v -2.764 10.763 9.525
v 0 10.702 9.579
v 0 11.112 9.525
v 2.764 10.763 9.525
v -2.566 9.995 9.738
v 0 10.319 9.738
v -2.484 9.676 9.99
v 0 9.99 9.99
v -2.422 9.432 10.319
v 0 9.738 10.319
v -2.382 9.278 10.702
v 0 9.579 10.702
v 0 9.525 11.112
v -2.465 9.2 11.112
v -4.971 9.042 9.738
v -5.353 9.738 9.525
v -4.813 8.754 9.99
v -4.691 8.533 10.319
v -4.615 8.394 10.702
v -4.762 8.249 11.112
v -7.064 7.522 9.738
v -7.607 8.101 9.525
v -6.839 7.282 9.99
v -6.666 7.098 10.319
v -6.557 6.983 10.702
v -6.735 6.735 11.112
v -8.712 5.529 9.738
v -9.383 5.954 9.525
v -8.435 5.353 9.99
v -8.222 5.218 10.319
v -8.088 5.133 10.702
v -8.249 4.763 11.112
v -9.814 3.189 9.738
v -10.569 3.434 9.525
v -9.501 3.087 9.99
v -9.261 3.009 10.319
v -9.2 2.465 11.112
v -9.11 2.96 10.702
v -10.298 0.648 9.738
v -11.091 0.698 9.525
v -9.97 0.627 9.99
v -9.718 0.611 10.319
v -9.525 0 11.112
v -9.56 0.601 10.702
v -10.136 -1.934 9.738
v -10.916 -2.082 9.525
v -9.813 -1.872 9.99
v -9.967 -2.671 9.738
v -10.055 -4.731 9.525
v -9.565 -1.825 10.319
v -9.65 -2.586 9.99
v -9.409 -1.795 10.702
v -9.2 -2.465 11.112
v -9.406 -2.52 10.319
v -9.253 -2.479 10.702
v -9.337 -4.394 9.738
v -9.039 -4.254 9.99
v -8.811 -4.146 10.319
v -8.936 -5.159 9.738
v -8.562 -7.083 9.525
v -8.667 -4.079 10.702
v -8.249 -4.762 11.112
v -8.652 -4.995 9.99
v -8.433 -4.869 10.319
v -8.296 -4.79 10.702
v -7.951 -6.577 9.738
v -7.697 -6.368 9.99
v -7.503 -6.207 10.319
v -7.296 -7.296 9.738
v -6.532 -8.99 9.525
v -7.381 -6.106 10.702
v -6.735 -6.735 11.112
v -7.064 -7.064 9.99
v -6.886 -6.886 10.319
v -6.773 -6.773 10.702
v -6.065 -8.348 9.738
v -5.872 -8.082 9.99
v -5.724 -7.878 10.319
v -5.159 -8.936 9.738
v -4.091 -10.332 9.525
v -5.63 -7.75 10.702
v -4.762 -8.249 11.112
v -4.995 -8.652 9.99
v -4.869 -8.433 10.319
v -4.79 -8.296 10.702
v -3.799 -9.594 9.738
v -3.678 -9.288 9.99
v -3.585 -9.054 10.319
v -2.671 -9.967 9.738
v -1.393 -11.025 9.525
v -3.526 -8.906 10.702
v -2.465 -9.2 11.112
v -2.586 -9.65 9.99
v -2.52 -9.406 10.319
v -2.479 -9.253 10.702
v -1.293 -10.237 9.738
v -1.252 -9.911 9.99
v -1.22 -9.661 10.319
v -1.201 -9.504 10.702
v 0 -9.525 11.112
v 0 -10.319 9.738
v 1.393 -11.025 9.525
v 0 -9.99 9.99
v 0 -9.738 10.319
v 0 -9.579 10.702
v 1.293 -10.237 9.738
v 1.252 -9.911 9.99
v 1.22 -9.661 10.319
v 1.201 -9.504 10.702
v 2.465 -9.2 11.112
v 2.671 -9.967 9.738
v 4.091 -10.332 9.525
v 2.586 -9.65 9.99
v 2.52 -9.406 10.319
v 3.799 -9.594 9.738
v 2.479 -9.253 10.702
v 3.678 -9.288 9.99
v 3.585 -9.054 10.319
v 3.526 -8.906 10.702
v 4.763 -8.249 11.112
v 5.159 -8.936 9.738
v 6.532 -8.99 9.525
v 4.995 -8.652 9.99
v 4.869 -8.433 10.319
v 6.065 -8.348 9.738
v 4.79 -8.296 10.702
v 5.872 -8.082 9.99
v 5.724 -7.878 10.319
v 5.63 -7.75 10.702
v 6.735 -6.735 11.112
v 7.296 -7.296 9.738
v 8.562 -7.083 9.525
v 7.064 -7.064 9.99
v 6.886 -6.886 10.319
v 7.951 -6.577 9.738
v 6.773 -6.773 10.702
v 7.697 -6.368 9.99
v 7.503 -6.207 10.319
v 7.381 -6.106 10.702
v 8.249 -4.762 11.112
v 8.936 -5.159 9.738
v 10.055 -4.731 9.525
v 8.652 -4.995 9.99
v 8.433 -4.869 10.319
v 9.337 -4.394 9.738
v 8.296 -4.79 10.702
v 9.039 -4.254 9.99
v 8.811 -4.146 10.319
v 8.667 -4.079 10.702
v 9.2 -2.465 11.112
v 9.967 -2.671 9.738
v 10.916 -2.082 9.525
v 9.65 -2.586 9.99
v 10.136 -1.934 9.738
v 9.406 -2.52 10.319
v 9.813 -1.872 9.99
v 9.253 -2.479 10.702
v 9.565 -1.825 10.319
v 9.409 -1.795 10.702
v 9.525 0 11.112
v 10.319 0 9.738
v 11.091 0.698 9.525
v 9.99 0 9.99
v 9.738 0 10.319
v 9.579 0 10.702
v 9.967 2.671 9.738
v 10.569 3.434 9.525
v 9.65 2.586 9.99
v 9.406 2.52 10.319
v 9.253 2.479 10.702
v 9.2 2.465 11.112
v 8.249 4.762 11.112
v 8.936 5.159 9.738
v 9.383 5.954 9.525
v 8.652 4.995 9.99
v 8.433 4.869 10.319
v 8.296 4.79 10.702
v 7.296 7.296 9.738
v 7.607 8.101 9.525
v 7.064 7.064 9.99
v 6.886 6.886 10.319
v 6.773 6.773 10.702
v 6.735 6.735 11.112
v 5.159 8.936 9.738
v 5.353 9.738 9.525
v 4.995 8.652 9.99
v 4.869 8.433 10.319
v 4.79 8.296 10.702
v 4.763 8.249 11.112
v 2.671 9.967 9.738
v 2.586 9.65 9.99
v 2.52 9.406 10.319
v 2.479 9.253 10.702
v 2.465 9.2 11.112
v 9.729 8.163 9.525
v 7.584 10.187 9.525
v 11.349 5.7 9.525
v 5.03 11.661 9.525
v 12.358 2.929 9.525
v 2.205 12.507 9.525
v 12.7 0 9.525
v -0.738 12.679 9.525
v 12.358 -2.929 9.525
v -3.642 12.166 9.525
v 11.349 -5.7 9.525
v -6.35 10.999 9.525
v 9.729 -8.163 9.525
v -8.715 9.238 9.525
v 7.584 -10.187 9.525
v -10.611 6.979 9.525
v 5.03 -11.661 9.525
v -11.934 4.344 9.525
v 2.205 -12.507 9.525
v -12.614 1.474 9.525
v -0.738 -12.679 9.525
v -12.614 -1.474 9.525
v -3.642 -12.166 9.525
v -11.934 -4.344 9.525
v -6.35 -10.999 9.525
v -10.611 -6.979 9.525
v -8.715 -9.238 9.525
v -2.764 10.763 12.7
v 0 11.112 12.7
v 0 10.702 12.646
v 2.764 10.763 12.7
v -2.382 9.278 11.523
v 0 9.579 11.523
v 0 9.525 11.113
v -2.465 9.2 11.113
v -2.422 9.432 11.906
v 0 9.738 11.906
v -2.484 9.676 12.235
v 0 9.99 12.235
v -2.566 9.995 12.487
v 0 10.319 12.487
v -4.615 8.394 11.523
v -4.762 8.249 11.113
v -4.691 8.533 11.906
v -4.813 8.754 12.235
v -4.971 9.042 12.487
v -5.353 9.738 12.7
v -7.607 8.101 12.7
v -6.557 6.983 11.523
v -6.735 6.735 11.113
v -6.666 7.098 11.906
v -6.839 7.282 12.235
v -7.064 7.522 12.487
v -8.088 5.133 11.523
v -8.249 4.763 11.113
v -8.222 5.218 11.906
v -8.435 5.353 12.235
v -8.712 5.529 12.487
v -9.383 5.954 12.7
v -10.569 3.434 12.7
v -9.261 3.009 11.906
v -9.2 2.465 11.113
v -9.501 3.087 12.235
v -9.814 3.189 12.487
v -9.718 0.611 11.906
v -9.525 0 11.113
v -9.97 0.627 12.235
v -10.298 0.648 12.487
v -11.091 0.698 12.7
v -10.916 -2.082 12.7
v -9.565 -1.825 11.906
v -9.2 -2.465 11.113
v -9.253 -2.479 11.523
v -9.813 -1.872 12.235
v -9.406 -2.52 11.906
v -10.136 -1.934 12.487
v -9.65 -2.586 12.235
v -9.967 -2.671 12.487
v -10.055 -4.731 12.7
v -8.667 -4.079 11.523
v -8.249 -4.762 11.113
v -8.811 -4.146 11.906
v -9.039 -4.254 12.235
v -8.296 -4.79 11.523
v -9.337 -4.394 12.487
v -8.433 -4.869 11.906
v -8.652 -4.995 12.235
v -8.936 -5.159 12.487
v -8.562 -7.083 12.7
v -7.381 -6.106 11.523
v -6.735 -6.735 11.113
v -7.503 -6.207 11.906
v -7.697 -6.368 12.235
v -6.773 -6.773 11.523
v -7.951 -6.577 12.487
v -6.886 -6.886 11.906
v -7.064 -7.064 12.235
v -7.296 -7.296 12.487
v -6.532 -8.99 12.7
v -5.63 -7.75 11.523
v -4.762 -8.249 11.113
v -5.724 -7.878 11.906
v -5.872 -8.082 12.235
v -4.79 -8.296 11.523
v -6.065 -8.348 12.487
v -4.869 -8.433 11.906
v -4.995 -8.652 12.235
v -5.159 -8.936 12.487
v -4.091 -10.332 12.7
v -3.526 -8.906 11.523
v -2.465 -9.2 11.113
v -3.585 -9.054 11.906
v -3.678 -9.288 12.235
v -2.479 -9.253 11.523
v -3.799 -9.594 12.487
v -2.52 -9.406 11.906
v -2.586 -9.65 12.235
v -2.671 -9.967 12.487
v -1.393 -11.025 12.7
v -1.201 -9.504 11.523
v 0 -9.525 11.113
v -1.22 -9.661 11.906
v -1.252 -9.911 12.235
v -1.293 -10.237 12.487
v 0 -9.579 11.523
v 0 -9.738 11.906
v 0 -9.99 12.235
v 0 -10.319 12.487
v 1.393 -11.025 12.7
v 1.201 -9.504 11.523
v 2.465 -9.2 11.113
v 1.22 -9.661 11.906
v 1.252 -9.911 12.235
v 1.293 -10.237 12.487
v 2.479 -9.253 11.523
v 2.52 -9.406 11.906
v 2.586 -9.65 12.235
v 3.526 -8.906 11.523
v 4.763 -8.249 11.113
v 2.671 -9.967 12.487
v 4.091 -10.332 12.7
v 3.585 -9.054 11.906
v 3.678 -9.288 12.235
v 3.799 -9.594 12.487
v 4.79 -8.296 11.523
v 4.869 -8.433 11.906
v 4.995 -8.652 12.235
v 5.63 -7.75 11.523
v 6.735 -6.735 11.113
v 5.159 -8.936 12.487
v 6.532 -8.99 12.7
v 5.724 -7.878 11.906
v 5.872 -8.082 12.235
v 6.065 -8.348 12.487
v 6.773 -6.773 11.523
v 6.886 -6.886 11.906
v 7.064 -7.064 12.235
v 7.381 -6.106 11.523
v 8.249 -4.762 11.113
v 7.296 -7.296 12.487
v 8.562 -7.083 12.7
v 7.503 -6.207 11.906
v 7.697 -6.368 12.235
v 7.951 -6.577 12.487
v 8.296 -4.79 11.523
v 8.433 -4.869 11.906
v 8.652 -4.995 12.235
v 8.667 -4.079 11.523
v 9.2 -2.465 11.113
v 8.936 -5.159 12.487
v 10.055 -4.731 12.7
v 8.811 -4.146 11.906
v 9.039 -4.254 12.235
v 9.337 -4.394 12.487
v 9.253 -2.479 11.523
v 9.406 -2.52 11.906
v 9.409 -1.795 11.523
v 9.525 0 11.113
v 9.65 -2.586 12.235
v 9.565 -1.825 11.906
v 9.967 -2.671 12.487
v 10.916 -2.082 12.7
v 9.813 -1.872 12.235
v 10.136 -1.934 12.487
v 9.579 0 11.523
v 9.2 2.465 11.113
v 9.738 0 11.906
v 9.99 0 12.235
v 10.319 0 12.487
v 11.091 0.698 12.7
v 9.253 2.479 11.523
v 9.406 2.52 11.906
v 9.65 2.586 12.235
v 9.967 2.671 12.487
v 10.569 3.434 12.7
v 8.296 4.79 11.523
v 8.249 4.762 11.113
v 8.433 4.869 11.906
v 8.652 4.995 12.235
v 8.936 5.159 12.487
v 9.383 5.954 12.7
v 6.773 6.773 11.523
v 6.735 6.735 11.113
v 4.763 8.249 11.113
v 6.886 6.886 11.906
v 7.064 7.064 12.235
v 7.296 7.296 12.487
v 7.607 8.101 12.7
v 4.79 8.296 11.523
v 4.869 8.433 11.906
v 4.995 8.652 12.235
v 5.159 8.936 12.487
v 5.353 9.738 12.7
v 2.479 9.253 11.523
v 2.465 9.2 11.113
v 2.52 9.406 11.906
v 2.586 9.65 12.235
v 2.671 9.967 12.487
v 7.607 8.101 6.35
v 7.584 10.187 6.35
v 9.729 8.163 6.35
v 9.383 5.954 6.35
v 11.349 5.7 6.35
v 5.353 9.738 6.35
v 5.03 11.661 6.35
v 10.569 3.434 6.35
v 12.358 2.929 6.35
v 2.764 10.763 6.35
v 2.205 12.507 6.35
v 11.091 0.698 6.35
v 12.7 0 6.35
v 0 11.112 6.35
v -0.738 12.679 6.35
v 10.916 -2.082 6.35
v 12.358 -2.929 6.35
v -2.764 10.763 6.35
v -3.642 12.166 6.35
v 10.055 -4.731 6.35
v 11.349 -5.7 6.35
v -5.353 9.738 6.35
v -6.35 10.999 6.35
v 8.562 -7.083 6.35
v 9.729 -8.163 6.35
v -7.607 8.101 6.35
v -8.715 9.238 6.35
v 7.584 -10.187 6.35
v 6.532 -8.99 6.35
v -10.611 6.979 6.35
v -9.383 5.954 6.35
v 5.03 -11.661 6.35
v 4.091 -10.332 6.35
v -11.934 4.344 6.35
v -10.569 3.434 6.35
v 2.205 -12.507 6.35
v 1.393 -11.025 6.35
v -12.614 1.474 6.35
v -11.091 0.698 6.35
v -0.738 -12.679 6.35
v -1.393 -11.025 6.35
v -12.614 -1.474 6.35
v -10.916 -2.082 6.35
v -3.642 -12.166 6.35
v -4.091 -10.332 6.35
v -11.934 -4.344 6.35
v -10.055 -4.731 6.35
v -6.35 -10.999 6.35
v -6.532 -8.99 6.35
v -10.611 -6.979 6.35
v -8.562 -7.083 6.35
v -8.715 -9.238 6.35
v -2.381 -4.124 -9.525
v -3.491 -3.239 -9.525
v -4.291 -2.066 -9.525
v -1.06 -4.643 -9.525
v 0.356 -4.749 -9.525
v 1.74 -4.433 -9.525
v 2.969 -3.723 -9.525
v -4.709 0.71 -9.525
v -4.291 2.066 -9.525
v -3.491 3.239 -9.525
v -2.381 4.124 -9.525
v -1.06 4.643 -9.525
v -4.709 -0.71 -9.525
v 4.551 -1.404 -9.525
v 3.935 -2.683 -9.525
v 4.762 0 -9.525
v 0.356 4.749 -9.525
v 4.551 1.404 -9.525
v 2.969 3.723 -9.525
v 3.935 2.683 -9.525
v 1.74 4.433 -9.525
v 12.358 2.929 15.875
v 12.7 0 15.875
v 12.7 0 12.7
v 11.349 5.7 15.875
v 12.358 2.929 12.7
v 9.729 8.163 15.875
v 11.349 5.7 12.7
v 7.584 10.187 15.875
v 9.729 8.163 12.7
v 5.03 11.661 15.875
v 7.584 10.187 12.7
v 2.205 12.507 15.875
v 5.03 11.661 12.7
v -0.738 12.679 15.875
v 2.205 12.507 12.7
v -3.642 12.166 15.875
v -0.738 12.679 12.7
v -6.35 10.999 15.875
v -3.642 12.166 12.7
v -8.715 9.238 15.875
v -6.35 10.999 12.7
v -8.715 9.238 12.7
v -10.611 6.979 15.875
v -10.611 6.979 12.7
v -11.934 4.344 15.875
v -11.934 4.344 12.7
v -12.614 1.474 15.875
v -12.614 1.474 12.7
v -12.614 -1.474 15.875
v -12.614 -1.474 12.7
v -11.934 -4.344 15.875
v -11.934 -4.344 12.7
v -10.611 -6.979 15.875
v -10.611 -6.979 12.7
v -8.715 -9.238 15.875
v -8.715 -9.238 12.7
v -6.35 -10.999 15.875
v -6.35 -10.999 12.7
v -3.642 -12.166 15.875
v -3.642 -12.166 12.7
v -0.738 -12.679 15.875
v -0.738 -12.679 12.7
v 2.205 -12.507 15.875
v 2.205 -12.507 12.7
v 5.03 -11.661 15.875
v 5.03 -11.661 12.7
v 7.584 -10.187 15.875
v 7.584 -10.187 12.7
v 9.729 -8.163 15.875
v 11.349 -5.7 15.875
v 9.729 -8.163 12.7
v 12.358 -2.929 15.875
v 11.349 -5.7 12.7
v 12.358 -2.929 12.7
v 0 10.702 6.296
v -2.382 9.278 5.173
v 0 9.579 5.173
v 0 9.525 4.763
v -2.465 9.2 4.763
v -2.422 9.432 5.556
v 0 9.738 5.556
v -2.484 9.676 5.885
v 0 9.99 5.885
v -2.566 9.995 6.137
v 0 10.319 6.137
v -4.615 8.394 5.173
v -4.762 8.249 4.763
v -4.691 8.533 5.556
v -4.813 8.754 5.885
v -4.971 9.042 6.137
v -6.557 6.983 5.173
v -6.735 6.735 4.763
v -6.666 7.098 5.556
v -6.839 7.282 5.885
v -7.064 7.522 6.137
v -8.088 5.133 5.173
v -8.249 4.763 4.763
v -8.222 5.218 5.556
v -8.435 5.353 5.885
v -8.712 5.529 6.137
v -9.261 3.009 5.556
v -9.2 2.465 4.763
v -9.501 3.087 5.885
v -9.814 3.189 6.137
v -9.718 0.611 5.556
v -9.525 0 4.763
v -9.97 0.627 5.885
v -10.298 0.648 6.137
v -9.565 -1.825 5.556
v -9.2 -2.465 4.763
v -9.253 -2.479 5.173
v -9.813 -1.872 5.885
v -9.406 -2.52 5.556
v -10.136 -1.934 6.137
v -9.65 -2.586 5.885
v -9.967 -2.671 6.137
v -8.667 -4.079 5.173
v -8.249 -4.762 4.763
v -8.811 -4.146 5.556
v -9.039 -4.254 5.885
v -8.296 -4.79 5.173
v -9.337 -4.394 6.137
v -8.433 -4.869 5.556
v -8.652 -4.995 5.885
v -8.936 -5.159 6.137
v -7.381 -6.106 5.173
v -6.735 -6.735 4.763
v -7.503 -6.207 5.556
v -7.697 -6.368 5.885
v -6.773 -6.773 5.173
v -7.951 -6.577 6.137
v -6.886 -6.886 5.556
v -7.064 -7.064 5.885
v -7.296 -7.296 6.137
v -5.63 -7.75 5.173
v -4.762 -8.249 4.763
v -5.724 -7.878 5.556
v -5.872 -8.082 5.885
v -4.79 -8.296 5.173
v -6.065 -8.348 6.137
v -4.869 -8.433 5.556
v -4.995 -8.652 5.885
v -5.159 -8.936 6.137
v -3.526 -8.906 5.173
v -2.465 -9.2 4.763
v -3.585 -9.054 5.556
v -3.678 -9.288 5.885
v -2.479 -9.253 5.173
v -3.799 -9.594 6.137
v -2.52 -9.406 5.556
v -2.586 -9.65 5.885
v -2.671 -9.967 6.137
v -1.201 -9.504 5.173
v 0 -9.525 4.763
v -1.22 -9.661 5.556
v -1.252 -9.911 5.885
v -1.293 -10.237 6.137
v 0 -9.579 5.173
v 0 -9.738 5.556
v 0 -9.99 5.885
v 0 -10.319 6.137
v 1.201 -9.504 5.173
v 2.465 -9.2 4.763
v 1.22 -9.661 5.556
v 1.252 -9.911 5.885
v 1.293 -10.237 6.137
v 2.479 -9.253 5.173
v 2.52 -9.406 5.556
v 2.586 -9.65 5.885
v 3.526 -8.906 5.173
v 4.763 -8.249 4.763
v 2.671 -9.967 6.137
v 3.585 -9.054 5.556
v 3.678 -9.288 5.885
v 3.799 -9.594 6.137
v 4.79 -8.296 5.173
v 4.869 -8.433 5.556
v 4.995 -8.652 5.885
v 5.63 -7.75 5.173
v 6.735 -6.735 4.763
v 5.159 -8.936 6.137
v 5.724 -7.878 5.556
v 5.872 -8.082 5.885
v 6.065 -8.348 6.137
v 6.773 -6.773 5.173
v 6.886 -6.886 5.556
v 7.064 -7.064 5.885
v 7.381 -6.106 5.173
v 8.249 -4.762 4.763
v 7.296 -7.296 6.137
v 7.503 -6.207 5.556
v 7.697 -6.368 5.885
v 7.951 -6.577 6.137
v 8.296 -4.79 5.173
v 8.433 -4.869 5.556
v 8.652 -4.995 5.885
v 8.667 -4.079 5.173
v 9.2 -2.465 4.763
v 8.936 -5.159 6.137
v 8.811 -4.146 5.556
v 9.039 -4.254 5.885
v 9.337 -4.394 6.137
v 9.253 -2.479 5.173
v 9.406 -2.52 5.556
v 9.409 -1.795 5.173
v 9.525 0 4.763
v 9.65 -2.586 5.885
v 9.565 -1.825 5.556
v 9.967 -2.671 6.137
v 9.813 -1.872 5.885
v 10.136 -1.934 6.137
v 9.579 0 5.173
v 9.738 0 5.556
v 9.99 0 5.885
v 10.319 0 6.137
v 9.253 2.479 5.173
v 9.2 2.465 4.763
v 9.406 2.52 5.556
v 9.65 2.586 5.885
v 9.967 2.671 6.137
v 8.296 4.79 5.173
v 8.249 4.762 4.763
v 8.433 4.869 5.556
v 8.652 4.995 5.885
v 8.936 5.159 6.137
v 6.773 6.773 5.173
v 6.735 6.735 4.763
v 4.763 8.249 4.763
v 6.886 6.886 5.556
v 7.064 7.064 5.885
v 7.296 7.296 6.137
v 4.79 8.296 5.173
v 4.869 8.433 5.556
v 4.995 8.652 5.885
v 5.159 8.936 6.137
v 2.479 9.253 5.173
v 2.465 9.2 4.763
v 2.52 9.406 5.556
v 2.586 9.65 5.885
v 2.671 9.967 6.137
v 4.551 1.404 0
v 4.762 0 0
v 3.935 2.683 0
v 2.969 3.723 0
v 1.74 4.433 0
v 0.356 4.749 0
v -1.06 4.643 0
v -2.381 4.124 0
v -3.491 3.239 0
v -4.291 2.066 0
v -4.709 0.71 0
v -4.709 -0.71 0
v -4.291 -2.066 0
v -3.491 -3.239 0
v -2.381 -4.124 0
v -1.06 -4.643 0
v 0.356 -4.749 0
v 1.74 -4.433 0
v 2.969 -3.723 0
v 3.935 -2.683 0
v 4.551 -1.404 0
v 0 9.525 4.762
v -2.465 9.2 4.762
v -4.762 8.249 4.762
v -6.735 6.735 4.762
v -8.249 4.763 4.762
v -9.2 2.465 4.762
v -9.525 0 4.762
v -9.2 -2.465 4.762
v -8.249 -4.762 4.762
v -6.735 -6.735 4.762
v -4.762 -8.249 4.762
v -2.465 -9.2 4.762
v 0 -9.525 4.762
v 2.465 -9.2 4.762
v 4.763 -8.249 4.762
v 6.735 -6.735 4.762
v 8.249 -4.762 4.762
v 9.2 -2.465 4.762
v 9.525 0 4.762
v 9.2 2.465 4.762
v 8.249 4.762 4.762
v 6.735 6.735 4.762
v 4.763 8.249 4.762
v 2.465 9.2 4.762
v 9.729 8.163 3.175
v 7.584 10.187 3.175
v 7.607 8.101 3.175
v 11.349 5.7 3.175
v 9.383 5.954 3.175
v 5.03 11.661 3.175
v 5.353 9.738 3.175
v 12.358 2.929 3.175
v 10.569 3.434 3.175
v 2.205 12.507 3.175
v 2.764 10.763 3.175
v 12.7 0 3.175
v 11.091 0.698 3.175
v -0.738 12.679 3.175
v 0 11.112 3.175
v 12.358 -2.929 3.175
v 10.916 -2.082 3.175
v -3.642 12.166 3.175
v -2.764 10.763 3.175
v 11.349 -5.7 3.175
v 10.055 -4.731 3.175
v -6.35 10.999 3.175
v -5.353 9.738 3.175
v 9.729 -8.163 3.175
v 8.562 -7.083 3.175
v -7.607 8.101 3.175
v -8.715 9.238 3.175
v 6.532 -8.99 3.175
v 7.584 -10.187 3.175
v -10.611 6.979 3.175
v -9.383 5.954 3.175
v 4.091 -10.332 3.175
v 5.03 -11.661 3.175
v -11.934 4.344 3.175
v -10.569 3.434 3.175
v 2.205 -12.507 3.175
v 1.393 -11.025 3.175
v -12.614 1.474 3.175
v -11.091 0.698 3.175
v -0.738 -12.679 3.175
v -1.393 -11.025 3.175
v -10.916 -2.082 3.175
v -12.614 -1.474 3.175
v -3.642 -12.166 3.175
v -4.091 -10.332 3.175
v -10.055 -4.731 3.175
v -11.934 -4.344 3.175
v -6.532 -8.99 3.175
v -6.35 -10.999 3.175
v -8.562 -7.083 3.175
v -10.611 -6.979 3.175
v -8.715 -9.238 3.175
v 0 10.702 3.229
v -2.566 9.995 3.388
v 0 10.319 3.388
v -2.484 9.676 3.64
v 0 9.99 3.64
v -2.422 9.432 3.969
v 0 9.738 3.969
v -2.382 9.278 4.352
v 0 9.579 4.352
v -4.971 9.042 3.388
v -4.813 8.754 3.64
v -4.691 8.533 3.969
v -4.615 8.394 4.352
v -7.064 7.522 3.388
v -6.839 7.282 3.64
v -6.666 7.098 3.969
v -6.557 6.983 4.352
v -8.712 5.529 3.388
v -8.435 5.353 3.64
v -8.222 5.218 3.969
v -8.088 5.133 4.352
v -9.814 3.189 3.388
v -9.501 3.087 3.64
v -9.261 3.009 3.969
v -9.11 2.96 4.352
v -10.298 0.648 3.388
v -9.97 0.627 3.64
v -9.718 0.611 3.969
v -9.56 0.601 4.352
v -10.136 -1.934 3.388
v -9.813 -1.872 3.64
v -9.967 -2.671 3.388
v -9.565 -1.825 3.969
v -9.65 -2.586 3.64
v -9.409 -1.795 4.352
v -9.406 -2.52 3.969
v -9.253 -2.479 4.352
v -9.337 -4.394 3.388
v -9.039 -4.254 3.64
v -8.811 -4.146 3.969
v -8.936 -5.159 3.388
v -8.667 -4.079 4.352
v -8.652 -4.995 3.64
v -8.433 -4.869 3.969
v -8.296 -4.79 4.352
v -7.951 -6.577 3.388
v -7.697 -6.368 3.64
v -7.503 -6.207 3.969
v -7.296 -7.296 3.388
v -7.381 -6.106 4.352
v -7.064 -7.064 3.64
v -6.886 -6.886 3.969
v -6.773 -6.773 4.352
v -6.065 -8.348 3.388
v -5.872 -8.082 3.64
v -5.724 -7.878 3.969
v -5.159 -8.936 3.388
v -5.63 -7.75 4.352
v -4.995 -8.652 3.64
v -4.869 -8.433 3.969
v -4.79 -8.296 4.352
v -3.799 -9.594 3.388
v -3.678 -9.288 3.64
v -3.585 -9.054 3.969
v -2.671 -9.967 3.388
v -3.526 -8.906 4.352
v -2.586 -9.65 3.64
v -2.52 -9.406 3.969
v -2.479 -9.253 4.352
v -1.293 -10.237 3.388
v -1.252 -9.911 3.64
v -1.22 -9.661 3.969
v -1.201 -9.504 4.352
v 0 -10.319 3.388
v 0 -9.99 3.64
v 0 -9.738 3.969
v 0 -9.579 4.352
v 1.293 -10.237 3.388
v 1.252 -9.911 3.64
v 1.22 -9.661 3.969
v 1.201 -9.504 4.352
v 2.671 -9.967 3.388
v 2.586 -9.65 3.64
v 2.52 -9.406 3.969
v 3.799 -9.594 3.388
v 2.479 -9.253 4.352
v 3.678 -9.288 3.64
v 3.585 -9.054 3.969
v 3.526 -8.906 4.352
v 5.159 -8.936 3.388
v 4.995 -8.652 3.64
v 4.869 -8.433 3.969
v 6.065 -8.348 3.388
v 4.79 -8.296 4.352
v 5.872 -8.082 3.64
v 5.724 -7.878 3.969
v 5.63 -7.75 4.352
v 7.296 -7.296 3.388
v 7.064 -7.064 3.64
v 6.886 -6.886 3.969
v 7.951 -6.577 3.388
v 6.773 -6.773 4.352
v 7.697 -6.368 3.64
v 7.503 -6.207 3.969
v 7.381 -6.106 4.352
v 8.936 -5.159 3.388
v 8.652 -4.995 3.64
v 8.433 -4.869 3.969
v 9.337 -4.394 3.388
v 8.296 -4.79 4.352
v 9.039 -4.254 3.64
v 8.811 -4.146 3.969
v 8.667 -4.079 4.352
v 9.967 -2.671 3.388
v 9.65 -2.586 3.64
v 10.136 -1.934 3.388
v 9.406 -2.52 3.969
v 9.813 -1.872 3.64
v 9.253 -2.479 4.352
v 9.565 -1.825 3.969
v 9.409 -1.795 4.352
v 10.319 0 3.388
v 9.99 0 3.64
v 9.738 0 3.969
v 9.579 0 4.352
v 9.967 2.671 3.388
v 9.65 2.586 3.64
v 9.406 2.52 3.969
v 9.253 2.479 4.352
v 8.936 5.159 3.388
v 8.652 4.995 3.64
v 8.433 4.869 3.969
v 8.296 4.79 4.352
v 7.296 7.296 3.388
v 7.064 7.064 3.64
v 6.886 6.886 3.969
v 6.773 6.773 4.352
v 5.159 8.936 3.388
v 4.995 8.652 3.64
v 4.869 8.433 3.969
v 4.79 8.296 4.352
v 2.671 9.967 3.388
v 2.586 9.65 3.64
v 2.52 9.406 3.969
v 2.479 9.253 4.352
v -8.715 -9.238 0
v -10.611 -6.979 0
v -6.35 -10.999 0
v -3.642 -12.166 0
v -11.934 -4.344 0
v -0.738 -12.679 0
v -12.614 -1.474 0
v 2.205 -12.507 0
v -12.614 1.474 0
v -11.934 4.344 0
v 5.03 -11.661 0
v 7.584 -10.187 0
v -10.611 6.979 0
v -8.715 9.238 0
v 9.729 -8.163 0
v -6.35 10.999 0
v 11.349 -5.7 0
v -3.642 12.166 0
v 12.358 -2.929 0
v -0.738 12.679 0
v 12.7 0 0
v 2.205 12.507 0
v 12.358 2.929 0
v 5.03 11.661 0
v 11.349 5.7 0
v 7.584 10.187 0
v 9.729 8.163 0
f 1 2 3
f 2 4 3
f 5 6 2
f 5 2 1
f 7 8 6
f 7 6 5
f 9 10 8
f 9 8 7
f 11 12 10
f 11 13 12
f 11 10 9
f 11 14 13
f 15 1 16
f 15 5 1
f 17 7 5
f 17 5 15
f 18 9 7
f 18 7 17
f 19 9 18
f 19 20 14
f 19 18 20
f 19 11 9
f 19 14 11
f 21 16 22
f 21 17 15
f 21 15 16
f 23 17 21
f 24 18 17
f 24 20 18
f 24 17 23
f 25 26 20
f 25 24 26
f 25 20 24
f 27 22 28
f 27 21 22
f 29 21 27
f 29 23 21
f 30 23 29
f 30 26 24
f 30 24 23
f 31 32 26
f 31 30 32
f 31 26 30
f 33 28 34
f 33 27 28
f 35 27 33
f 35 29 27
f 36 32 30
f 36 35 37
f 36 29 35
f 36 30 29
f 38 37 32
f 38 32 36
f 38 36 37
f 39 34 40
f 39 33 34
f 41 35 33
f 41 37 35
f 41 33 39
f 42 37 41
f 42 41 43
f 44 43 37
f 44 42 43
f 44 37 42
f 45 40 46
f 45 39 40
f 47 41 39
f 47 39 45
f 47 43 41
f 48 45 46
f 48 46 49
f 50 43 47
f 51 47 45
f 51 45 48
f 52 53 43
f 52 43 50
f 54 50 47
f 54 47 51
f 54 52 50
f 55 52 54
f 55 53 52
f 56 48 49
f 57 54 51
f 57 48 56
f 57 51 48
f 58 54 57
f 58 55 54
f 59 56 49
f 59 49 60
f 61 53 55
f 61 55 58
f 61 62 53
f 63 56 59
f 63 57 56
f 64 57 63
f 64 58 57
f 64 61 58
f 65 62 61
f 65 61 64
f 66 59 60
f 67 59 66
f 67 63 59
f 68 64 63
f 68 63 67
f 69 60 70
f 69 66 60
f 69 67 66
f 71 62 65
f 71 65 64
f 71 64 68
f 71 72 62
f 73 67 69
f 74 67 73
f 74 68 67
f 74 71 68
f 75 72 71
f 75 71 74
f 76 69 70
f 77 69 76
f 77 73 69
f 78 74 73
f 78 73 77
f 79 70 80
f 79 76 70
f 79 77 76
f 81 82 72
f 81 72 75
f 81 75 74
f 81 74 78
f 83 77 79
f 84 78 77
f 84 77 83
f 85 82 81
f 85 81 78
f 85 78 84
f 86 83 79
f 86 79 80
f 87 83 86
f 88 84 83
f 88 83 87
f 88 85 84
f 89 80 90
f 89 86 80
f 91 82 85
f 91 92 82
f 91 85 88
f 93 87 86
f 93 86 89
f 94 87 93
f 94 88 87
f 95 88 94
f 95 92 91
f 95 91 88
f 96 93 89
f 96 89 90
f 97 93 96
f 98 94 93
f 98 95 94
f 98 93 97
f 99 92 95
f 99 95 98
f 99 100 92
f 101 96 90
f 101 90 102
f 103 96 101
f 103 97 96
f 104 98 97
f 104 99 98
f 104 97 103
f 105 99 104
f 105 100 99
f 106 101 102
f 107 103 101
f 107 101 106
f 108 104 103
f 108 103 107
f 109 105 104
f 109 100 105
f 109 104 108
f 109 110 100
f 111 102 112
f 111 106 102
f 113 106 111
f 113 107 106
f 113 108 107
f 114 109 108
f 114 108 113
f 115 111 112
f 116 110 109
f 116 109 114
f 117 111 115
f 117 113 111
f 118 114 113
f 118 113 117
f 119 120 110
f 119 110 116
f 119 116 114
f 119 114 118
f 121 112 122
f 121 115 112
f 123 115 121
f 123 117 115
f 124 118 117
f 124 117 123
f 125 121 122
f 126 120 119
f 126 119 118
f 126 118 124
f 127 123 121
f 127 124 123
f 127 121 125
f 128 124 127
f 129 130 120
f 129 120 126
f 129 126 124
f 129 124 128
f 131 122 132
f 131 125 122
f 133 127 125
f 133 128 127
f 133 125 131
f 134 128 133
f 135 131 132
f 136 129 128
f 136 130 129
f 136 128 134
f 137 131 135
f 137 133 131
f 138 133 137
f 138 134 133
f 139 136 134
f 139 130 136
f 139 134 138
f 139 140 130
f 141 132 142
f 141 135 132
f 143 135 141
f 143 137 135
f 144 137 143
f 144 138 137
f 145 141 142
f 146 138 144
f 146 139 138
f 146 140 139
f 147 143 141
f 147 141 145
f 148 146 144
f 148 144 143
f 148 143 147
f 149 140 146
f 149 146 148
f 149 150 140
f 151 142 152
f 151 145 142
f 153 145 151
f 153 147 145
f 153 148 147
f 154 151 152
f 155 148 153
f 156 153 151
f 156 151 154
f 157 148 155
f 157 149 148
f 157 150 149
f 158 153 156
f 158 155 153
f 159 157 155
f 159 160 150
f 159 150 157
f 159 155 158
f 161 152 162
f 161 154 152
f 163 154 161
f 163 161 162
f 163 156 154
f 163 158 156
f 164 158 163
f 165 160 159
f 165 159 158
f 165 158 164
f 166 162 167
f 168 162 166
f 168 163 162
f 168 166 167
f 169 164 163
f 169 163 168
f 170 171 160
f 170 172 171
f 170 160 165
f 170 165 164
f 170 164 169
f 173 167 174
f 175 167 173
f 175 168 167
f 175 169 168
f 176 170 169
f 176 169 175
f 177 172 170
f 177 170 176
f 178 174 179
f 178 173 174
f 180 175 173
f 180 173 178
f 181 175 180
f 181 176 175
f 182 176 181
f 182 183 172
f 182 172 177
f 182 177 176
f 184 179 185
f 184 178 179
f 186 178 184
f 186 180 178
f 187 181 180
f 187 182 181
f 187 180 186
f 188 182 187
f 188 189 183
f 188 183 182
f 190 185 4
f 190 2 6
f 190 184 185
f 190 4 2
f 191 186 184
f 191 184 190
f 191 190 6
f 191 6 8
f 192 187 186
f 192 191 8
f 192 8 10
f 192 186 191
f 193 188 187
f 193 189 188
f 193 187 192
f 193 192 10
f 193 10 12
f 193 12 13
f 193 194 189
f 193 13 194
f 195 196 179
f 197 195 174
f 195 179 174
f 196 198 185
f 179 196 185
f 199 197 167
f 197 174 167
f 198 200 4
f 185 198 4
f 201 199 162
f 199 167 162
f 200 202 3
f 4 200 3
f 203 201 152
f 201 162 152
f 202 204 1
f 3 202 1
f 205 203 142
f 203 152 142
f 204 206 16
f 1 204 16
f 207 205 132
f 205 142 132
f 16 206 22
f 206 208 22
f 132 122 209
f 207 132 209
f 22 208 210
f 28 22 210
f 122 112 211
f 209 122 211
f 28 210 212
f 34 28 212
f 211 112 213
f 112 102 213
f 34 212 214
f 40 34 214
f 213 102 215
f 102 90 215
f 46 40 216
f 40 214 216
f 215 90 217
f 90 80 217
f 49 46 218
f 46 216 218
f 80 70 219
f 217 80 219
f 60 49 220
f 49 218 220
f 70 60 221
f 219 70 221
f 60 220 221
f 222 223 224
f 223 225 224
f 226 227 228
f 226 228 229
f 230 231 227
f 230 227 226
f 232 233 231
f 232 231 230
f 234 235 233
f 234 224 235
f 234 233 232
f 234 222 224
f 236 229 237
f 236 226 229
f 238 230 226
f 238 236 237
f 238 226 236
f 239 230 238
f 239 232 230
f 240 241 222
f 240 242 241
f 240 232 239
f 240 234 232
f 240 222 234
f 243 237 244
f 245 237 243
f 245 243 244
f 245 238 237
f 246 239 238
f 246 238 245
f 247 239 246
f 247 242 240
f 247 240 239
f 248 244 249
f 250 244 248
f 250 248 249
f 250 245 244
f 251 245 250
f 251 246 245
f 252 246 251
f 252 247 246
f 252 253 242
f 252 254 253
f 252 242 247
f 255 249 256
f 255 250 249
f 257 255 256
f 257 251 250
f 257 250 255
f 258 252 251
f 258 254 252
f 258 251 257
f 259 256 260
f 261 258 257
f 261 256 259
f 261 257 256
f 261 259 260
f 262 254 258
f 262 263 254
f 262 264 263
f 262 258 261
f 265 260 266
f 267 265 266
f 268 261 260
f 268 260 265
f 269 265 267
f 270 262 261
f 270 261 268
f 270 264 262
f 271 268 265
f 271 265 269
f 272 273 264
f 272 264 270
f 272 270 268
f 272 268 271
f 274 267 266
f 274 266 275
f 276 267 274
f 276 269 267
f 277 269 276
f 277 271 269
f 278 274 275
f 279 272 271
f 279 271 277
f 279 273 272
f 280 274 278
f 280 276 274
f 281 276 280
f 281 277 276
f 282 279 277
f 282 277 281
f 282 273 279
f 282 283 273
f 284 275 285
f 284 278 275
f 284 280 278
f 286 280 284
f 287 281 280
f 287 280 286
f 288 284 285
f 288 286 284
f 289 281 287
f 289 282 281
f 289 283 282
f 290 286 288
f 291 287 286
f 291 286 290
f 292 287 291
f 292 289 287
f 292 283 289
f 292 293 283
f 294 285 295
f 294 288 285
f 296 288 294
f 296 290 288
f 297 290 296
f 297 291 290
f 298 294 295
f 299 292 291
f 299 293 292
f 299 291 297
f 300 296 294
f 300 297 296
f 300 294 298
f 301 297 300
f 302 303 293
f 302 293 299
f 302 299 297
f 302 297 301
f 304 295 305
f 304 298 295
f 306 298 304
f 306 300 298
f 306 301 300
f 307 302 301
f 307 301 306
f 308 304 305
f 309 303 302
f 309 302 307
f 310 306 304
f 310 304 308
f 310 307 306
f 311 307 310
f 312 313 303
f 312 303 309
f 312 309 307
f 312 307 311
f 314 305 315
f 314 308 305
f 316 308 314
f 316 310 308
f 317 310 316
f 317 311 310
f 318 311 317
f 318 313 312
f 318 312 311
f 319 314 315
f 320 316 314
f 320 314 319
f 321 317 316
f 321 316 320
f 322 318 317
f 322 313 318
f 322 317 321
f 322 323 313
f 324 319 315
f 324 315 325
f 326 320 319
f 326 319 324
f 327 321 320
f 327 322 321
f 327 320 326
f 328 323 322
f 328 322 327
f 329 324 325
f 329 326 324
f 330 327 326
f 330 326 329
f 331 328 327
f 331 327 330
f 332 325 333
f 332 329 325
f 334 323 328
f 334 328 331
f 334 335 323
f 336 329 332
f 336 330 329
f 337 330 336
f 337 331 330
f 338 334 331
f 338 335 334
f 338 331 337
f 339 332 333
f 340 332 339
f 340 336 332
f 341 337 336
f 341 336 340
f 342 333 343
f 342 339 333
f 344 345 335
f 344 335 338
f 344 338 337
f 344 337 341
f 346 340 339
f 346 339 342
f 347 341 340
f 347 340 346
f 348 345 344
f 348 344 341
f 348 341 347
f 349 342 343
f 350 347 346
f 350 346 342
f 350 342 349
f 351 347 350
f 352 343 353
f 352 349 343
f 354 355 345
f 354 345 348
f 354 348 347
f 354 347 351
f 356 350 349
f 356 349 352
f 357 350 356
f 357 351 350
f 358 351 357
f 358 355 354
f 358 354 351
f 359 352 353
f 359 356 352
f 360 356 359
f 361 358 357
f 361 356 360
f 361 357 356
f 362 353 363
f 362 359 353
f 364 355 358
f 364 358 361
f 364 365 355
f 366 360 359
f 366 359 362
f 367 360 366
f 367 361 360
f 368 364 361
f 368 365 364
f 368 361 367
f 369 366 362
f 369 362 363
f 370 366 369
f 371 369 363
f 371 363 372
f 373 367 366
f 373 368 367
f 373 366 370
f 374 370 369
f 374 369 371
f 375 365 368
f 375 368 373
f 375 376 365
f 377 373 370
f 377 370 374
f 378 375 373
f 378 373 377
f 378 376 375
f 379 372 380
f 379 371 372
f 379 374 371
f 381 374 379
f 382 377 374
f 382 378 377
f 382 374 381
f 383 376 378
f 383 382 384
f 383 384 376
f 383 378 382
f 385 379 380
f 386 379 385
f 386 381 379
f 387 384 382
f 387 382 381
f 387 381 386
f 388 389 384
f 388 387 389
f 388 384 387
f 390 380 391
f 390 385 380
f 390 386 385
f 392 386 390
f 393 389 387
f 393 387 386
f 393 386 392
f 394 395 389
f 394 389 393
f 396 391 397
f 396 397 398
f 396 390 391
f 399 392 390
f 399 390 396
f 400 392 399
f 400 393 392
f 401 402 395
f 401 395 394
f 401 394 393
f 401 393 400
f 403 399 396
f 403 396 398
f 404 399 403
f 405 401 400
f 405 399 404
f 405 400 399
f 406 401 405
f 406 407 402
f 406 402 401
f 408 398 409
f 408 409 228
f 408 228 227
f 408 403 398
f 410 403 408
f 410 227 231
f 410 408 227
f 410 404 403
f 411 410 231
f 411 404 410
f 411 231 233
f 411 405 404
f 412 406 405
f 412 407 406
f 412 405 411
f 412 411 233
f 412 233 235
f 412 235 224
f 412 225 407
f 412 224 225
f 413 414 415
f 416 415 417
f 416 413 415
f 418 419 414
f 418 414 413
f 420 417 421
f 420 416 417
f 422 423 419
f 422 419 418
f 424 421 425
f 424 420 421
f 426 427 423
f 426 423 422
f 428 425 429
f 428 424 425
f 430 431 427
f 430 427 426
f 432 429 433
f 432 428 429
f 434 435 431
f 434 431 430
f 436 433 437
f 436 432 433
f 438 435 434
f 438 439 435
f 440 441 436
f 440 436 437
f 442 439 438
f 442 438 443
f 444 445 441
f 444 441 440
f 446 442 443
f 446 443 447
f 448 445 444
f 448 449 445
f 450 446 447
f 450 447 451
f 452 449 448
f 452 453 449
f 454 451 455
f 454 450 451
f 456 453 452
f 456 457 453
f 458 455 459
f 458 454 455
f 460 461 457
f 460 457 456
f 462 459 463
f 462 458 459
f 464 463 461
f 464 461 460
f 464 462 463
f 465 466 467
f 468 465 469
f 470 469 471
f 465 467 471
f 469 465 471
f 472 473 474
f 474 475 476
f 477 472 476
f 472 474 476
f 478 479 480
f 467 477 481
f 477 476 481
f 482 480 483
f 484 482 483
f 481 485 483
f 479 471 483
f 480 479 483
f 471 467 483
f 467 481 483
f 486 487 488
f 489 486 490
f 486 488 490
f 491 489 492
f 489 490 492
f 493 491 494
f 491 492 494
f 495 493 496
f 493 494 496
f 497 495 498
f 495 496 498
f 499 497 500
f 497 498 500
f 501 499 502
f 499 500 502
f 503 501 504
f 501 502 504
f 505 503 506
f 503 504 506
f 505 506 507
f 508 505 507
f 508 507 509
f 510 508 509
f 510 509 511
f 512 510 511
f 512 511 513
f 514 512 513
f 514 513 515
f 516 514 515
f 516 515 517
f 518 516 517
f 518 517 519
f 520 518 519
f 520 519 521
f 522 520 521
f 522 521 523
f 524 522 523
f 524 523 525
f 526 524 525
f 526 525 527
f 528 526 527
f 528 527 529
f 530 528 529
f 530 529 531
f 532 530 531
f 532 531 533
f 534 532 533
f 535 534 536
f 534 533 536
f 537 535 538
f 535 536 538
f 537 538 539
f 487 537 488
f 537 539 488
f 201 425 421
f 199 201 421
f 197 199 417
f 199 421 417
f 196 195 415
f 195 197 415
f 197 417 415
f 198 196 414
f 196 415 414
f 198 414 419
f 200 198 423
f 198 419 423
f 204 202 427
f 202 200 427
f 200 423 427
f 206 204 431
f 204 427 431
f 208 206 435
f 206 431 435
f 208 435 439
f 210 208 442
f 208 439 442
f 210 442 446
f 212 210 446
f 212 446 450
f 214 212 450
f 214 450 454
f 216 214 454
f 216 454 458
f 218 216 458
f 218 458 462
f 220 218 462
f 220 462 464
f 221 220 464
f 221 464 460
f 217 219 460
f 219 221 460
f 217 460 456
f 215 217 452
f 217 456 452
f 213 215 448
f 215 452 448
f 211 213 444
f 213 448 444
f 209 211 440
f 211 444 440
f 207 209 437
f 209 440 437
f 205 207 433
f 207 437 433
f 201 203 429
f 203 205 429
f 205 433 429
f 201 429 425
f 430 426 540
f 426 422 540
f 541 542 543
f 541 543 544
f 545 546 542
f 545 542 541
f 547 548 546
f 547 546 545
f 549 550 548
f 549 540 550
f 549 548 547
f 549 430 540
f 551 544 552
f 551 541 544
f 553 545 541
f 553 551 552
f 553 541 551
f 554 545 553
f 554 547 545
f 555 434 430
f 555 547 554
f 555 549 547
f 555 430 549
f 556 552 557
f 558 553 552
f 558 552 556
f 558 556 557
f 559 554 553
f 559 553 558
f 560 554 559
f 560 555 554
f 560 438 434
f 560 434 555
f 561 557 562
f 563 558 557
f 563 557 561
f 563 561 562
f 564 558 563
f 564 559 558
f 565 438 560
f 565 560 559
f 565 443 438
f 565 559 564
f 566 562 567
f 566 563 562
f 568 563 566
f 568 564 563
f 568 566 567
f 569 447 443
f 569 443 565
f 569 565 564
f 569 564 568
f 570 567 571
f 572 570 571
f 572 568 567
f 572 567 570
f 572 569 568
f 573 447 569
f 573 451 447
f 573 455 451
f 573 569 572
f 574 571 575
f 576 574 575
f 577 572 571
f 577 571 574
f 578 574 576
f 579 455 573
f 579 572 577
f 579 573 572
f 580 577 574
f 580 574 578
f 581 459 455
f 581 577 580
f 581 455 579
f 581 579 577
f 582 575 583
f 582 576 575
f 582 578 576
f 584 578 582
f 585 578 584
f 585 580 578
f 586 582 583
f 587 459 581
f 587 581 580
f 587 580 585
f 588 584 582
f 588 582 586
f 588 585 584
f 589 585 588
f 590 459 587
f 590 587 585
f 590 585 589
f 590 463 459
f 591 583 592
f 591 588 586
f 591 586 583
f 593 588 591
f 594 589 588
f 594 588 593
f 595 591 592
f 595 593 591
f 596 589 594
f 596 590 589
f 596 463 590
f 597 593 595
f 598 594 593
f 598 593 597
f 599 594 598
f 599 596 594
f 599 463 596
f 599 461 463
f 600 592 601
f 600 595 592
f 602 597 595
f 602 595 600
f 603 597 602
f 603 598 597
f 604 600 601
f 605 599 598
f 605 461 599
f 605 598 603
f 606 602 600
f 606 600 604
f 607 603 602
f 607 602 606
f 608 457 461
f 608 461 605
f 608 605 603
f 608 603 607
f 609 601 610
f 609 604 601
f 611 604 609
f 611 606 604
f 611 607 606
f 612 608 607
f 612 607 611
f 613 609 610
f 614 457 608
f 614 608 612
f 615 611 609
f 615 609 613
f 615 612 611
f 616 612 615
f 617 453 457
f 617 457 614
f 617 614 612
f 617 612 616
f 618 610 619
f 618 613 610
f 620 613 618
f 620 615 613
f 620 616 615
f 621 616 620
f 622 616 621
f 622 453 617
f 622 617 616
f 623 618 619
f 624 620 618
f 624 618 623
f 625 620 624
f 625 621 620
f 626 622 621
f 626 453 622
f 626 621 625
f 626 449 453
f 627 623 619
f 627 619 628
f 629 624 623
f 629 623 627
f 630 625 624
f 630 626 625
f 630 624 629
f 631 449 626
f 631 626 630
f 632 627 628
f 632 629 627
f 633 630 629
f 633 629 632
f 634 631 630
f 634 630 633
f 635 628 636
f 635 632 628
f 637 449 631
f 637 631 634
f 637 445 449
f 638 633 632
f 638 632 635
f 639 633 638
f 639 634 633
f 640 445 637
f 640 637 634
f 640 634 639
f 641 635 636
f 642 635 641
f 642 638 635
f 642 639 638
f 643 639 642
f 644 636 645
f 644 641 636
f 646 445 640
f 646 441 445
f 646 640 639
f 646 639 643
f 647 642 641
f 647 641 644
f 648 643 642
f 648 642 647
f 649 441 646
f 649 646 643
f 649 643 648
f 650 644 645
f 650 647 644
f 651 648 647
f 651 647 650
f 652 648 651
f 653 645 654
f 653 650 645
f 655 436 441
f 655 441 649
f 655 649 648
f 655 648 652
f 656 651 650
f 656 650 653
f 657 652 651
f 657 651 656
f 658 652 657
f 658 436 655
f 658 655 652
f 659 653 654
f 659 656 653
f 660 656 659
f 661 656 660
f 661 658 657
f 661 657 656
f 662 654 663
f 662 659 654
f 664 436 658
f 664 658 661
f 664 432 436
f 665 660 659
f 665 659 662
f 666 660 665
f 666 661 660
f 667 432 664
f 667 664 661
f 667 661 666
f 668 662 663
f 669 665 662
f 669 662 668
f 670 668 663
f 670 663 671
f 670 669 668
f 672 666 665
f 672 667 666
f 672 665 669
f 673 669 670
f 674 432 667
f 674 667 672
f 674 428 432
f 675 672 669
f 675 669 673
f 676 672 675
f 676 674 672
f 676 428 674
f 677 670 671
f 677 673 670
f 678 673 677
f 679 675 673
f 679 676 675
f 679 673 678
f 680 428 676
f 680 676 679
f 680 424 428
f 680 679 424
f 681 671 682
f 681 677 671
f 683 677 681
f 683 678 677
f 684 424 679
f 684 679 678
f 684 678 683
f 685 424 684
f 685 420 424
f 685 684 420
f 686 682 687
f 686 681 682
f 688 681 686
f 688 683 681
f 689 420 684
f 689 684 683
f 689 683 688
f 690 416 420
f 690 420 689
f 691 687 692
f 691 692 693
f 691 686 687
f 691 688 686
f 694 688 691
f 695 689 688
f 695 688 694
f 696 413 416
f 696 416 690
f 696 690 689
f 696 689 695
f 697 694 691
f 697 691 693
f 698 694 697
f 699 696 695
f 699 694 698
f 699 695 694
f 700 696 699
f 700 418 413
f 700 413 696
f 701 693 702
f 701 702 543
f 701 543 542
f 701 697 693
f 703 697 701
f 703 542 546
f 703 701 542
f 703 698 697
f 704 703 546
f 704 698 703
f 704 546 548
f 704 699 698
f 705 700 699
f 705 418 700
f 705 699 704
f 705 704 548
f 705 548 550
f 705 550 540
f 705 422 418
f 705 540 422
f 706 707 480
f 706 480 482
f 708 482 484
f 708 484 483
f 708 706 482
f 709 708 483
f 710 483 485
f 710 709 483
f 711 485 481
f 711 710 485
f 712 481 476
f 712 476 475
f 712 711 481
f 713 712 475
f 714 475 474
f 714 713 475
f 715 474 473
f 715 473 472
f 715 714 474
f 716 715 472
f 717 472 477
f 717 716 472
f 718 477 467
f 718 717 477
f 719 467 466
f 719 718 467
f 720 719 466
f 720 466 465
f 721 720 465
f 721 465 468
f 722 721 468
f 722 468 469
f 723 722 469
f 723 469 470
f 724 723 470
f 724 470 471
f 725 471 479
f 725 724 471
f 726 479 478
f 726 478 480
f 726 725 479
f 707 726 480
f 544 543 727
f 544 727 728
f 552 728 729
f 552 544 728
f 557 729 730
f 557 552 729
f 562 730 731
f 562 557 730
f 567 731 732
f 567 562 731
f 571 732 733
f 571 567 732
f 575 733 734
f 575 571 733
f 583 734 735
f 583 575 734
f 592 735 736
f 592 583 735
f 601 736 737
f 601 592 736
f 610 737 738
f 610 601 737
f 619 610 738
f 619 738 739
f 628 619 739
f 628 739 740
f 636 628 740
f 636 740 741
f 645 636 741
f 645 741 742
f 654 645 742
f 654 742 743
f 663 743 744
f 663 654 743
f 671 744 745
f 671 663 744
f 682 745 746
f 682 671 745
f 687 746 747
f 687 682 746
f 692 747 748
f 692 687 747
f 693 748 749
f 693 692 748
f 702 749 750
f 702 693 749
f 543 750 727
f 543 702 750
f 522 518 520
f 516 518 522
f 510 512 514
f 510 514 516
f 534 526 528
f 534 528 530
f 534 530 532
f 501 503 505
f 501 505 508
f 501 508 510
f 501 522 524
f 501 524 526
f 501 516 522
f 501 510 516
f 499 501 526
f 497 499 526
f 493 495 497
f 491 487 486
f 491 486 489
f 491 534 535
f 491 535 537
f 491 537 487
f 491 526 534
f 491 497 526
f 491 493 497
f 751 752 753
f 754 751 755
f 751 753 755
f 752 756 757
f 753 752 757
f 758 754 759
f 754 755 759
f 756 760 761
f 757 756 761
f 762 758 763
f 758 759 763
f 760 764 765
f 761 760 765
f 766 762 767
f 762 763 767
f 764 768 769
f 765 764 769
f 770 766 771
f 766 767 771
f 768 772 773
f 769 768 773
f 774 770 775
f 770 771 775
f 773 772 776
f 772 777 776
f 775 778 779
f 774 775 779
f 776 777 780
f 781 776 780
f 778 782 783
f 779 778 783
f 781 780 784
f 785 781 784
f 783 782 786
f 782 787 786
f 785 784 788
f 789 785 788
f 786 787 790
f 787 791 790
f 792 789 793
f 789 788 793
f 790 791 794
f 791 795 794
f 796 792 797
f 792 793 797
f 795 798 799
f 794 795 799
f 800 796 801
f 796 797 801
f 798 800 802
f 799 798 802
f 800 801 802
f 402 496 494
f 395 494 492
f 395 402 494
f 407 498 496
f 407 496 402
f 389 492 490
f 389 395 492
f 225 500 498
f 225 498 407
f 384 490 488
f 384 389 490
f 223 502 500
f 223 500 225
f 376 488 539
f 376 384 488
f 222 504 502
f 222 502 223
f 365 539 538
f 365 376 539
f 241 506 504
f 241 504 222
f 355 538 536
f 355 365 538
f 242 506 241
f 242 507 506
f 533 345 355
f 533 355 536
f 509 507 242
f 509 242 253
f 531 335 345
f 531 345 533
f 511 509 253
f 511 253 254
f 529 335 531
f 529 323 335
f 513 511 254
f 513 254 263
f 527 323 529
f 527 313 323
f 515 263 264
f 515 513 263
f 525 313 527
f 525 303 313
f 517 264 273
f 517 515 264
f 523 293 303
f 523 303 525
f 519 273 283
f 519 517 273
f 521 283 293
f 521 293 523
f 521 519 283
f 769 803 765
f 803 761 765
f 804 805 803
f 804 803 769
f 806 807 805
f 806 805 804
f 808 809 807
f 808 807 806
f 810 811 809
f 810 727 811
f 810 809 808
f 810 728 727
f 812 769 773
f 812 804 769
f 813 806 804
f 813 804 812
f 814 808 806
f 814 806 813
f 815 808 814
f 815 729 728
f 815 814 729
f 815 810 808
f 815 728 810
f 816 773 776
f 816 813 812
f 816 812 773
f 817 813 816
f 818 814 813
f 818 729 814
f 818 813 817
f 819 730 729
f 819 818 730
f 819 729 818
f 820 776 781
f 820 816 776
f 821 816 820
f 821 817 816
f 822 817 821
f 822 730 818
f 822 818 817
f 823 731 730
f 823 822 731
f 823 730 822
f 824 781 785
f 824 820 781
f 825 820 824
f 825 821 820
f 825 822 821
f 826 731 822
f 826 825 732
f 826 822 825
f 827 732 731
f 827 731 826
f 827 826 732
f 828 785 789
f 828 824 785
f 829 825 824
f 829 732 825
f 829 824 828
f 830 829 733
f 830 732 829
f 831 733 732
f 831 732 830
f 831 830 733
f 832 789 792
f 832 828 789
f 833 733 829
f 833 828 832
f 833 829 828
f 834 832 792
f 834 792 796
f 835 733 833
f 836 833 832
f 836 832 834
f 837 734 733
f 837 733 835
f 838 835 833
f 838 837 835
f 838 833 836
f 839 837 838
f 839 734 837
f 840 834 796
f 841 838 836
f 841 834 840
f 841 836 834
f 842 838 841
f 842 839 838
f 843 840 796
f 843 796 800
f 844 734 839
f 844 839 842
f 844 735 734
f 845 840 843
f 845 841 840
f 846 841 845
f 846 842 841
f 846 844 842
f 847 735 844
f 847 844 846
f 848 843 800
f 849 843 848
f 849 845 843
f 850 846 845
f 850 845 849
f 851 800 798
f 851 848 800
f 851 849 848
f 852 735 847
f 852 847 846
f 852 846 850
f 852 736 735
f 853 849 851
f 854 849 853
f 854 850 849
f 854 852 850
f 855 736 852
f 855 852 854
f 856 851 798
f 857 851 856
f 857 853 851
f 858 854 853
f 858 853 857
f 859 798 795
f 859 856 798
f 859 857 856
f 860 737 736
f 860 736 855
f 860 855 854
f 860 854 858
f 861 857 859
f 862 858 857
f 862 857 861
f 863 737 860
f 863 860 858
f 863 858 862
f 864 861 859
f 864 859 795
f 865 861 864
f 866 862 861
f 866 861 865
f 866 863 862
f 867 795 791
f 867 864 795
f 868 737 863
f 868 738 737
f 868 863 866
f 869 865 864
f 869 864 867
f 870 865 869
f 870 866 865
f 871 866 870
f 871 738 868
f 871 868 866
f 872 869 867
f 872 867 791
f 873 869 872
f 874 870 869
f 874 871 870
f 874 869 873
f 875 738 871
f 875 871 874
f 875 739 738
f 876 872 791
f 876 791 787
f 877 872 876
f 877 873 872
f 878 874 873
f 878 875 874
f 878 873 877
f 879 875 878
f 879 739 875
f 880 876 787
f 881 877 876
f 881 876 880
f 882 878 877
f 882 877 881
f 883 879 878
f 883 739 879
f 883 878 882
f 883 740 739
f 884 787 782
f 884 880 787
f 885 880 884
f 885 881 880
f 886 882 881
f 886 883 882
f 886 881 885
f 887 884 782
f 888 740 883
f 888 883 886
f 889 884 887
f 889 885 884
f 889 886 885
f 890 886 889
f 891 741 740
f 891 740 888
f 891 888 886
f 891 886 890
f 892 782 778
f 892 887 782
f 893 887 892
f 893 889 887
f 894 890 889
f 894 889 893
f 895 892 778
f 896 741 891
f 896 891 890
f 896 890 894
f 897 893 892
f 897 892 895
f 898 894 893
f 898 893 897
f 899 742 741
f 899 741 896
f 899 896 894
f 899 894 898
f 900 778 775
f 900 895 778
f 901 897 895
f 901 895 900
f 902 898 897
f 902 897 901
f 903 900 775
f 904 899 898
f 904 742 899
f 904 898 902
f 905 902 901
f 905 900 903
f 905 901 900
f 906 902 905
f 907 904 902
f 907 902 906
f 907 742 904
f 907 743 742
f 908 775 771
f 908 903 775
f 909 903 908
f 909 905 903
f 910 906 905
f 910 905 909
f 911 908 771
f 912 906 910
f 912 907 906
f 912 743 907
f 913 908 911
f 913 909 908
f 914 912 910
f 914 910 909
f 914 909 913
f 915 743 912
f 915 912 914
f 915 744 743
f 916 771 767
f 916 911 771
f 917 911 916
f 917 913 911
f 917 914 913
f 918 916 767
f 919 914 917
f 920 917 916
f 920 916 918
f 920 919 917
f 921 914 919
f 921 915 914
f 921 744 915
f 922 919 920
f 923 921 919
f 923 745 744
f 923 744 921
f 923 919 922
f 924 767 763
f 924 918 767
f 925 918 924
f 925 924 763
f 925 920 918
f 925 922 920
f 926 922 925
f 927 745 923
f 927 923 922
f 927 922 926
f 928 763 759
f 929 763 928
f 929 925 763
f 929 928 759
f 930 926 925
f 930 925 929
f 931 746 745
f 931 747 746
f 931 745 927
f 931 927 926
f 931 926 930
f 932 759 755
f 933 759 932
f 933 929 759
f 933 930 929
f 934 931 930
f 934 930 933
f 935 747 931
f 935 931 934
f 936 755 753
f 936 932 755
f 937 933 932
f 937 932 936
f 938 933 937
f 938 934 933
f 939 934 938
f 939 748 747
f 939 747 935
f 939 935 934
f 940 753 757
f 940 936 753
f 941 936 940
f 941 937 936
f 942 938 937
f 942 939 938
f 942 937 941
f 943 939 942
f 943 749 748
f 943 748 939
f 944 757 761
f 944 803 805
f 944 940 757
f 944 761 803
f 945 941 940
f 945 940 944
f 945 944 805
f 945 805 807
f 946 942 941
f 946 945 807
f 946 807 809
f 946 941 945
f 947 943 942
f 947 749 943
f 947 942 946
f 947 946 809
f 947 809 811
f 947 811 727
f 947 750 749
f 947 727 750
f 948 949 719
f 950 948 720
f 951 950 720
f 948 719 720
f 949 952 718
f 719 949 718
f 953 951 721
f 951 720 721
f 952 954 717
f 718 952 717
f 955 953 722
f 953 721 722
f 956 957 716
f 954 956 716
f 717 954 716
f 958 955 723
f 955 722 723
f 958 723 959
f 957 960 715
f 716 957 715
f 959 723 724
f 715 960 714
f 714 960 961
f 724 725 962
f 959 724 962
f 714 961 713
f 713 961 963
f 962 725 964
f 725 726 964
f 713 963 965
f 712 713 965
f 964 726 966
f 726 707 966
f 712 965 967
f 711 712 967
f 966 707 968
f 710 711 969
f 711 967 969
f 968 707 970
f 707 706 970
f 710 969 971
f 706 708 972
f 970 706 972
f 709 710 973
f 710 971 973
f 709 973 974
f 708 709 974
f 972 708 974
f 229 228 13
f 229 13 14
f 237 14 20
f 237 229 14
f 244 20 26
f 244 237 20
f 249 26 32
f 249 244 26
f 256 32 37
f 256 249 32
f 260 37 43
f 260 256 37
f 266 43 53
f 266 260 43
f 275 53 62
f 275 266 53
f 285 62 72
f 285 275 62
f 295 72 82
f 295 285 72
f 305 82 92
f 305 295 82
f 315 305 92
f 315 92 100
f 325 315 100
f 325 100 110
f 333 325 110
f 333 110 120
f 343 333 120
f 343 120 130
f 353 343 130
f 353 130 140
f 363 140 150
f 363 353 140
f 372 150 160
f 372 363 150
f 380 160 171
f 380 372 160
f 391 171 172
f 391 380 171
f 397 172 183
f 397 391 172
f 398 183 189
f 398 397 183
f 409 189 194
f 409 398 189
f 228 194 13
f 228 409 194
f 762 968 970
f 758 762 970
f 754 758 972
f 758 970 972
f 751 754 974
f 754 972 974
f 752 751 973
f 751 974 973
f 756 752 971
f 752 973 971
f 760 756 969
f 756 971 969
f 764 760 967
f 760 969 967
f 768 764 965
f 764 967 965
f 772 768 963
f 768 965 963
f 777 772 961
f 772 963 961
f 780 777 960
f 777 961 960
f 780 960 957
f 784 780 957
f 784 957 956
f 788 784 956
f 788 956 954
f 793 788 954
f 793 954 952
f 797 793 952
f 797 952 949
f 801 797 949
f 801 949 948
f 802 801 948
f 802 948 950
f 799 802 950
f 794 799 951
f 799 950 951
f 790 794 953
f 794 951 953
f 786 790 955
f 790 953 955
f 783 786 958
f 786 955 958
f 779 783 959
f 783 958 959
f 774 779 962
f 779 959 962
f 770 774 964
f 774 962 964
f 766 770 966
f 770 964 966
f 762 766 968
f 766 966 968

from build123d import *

# Parameters (mm, degrees)
F0_R     = 12.7
F0_R_2   = 4.7625
F1_DEPTH = 15.875
F3_DEPTH = 9.525
F4_W     = 3.175
F4_H     = 3.175
F6_R     = 1.58749


# Not quite as in the source:
# - a fillet or chamfer is up to 0.001 mm smaller than in the source, because OpenCascade refuses the exact size


with BuildPart() as f1:
    # F0 (on Top) → F1 (new body)
    with BuildSketch(Plane.XY):
        Circle(F0_R)
        Circle(F0_R_2, mode=Mode.SUBTRACT)
        Circle(F0_R_2)
    extrude(amount=F1_DEPTH)

    # F0 (on Top) → F3 (join)
    with BuildSketch(Plane.XY):
        Circle(F0_R_2)
    extrude(amount=-F3_DEPTH)

    # F4 (on Right) → F5 (revolve, cut)
    with BuildSketch(Plane.YZ):
        with Locations((11.1125, 4.7625)):
            Rectangle(F4_W, F4_H)
        with Locations((11.1125, 11.1125)):
            Rectangle(F4_W, F4_H)
    revolve(axis=Axis((0, 0, -0.284396112), (0, 0, 1)), mode=Mode.SUBTRACT)

    # F6 (radius 1.5875 in the source; OpenCascade refuses exactly that, so slightly less here)
    f6_edges = [f1.edges().sort_by_distance(p)[0] for p in [
        (0, -9.525, 3.175),
        (0, -9.525, 6.35),
        (0, -9.525, 9.525),
        (0, -9.525, 12.7),
    ]]
    fillet(f6_edges, radius=F6_R)


solid = f1.part
